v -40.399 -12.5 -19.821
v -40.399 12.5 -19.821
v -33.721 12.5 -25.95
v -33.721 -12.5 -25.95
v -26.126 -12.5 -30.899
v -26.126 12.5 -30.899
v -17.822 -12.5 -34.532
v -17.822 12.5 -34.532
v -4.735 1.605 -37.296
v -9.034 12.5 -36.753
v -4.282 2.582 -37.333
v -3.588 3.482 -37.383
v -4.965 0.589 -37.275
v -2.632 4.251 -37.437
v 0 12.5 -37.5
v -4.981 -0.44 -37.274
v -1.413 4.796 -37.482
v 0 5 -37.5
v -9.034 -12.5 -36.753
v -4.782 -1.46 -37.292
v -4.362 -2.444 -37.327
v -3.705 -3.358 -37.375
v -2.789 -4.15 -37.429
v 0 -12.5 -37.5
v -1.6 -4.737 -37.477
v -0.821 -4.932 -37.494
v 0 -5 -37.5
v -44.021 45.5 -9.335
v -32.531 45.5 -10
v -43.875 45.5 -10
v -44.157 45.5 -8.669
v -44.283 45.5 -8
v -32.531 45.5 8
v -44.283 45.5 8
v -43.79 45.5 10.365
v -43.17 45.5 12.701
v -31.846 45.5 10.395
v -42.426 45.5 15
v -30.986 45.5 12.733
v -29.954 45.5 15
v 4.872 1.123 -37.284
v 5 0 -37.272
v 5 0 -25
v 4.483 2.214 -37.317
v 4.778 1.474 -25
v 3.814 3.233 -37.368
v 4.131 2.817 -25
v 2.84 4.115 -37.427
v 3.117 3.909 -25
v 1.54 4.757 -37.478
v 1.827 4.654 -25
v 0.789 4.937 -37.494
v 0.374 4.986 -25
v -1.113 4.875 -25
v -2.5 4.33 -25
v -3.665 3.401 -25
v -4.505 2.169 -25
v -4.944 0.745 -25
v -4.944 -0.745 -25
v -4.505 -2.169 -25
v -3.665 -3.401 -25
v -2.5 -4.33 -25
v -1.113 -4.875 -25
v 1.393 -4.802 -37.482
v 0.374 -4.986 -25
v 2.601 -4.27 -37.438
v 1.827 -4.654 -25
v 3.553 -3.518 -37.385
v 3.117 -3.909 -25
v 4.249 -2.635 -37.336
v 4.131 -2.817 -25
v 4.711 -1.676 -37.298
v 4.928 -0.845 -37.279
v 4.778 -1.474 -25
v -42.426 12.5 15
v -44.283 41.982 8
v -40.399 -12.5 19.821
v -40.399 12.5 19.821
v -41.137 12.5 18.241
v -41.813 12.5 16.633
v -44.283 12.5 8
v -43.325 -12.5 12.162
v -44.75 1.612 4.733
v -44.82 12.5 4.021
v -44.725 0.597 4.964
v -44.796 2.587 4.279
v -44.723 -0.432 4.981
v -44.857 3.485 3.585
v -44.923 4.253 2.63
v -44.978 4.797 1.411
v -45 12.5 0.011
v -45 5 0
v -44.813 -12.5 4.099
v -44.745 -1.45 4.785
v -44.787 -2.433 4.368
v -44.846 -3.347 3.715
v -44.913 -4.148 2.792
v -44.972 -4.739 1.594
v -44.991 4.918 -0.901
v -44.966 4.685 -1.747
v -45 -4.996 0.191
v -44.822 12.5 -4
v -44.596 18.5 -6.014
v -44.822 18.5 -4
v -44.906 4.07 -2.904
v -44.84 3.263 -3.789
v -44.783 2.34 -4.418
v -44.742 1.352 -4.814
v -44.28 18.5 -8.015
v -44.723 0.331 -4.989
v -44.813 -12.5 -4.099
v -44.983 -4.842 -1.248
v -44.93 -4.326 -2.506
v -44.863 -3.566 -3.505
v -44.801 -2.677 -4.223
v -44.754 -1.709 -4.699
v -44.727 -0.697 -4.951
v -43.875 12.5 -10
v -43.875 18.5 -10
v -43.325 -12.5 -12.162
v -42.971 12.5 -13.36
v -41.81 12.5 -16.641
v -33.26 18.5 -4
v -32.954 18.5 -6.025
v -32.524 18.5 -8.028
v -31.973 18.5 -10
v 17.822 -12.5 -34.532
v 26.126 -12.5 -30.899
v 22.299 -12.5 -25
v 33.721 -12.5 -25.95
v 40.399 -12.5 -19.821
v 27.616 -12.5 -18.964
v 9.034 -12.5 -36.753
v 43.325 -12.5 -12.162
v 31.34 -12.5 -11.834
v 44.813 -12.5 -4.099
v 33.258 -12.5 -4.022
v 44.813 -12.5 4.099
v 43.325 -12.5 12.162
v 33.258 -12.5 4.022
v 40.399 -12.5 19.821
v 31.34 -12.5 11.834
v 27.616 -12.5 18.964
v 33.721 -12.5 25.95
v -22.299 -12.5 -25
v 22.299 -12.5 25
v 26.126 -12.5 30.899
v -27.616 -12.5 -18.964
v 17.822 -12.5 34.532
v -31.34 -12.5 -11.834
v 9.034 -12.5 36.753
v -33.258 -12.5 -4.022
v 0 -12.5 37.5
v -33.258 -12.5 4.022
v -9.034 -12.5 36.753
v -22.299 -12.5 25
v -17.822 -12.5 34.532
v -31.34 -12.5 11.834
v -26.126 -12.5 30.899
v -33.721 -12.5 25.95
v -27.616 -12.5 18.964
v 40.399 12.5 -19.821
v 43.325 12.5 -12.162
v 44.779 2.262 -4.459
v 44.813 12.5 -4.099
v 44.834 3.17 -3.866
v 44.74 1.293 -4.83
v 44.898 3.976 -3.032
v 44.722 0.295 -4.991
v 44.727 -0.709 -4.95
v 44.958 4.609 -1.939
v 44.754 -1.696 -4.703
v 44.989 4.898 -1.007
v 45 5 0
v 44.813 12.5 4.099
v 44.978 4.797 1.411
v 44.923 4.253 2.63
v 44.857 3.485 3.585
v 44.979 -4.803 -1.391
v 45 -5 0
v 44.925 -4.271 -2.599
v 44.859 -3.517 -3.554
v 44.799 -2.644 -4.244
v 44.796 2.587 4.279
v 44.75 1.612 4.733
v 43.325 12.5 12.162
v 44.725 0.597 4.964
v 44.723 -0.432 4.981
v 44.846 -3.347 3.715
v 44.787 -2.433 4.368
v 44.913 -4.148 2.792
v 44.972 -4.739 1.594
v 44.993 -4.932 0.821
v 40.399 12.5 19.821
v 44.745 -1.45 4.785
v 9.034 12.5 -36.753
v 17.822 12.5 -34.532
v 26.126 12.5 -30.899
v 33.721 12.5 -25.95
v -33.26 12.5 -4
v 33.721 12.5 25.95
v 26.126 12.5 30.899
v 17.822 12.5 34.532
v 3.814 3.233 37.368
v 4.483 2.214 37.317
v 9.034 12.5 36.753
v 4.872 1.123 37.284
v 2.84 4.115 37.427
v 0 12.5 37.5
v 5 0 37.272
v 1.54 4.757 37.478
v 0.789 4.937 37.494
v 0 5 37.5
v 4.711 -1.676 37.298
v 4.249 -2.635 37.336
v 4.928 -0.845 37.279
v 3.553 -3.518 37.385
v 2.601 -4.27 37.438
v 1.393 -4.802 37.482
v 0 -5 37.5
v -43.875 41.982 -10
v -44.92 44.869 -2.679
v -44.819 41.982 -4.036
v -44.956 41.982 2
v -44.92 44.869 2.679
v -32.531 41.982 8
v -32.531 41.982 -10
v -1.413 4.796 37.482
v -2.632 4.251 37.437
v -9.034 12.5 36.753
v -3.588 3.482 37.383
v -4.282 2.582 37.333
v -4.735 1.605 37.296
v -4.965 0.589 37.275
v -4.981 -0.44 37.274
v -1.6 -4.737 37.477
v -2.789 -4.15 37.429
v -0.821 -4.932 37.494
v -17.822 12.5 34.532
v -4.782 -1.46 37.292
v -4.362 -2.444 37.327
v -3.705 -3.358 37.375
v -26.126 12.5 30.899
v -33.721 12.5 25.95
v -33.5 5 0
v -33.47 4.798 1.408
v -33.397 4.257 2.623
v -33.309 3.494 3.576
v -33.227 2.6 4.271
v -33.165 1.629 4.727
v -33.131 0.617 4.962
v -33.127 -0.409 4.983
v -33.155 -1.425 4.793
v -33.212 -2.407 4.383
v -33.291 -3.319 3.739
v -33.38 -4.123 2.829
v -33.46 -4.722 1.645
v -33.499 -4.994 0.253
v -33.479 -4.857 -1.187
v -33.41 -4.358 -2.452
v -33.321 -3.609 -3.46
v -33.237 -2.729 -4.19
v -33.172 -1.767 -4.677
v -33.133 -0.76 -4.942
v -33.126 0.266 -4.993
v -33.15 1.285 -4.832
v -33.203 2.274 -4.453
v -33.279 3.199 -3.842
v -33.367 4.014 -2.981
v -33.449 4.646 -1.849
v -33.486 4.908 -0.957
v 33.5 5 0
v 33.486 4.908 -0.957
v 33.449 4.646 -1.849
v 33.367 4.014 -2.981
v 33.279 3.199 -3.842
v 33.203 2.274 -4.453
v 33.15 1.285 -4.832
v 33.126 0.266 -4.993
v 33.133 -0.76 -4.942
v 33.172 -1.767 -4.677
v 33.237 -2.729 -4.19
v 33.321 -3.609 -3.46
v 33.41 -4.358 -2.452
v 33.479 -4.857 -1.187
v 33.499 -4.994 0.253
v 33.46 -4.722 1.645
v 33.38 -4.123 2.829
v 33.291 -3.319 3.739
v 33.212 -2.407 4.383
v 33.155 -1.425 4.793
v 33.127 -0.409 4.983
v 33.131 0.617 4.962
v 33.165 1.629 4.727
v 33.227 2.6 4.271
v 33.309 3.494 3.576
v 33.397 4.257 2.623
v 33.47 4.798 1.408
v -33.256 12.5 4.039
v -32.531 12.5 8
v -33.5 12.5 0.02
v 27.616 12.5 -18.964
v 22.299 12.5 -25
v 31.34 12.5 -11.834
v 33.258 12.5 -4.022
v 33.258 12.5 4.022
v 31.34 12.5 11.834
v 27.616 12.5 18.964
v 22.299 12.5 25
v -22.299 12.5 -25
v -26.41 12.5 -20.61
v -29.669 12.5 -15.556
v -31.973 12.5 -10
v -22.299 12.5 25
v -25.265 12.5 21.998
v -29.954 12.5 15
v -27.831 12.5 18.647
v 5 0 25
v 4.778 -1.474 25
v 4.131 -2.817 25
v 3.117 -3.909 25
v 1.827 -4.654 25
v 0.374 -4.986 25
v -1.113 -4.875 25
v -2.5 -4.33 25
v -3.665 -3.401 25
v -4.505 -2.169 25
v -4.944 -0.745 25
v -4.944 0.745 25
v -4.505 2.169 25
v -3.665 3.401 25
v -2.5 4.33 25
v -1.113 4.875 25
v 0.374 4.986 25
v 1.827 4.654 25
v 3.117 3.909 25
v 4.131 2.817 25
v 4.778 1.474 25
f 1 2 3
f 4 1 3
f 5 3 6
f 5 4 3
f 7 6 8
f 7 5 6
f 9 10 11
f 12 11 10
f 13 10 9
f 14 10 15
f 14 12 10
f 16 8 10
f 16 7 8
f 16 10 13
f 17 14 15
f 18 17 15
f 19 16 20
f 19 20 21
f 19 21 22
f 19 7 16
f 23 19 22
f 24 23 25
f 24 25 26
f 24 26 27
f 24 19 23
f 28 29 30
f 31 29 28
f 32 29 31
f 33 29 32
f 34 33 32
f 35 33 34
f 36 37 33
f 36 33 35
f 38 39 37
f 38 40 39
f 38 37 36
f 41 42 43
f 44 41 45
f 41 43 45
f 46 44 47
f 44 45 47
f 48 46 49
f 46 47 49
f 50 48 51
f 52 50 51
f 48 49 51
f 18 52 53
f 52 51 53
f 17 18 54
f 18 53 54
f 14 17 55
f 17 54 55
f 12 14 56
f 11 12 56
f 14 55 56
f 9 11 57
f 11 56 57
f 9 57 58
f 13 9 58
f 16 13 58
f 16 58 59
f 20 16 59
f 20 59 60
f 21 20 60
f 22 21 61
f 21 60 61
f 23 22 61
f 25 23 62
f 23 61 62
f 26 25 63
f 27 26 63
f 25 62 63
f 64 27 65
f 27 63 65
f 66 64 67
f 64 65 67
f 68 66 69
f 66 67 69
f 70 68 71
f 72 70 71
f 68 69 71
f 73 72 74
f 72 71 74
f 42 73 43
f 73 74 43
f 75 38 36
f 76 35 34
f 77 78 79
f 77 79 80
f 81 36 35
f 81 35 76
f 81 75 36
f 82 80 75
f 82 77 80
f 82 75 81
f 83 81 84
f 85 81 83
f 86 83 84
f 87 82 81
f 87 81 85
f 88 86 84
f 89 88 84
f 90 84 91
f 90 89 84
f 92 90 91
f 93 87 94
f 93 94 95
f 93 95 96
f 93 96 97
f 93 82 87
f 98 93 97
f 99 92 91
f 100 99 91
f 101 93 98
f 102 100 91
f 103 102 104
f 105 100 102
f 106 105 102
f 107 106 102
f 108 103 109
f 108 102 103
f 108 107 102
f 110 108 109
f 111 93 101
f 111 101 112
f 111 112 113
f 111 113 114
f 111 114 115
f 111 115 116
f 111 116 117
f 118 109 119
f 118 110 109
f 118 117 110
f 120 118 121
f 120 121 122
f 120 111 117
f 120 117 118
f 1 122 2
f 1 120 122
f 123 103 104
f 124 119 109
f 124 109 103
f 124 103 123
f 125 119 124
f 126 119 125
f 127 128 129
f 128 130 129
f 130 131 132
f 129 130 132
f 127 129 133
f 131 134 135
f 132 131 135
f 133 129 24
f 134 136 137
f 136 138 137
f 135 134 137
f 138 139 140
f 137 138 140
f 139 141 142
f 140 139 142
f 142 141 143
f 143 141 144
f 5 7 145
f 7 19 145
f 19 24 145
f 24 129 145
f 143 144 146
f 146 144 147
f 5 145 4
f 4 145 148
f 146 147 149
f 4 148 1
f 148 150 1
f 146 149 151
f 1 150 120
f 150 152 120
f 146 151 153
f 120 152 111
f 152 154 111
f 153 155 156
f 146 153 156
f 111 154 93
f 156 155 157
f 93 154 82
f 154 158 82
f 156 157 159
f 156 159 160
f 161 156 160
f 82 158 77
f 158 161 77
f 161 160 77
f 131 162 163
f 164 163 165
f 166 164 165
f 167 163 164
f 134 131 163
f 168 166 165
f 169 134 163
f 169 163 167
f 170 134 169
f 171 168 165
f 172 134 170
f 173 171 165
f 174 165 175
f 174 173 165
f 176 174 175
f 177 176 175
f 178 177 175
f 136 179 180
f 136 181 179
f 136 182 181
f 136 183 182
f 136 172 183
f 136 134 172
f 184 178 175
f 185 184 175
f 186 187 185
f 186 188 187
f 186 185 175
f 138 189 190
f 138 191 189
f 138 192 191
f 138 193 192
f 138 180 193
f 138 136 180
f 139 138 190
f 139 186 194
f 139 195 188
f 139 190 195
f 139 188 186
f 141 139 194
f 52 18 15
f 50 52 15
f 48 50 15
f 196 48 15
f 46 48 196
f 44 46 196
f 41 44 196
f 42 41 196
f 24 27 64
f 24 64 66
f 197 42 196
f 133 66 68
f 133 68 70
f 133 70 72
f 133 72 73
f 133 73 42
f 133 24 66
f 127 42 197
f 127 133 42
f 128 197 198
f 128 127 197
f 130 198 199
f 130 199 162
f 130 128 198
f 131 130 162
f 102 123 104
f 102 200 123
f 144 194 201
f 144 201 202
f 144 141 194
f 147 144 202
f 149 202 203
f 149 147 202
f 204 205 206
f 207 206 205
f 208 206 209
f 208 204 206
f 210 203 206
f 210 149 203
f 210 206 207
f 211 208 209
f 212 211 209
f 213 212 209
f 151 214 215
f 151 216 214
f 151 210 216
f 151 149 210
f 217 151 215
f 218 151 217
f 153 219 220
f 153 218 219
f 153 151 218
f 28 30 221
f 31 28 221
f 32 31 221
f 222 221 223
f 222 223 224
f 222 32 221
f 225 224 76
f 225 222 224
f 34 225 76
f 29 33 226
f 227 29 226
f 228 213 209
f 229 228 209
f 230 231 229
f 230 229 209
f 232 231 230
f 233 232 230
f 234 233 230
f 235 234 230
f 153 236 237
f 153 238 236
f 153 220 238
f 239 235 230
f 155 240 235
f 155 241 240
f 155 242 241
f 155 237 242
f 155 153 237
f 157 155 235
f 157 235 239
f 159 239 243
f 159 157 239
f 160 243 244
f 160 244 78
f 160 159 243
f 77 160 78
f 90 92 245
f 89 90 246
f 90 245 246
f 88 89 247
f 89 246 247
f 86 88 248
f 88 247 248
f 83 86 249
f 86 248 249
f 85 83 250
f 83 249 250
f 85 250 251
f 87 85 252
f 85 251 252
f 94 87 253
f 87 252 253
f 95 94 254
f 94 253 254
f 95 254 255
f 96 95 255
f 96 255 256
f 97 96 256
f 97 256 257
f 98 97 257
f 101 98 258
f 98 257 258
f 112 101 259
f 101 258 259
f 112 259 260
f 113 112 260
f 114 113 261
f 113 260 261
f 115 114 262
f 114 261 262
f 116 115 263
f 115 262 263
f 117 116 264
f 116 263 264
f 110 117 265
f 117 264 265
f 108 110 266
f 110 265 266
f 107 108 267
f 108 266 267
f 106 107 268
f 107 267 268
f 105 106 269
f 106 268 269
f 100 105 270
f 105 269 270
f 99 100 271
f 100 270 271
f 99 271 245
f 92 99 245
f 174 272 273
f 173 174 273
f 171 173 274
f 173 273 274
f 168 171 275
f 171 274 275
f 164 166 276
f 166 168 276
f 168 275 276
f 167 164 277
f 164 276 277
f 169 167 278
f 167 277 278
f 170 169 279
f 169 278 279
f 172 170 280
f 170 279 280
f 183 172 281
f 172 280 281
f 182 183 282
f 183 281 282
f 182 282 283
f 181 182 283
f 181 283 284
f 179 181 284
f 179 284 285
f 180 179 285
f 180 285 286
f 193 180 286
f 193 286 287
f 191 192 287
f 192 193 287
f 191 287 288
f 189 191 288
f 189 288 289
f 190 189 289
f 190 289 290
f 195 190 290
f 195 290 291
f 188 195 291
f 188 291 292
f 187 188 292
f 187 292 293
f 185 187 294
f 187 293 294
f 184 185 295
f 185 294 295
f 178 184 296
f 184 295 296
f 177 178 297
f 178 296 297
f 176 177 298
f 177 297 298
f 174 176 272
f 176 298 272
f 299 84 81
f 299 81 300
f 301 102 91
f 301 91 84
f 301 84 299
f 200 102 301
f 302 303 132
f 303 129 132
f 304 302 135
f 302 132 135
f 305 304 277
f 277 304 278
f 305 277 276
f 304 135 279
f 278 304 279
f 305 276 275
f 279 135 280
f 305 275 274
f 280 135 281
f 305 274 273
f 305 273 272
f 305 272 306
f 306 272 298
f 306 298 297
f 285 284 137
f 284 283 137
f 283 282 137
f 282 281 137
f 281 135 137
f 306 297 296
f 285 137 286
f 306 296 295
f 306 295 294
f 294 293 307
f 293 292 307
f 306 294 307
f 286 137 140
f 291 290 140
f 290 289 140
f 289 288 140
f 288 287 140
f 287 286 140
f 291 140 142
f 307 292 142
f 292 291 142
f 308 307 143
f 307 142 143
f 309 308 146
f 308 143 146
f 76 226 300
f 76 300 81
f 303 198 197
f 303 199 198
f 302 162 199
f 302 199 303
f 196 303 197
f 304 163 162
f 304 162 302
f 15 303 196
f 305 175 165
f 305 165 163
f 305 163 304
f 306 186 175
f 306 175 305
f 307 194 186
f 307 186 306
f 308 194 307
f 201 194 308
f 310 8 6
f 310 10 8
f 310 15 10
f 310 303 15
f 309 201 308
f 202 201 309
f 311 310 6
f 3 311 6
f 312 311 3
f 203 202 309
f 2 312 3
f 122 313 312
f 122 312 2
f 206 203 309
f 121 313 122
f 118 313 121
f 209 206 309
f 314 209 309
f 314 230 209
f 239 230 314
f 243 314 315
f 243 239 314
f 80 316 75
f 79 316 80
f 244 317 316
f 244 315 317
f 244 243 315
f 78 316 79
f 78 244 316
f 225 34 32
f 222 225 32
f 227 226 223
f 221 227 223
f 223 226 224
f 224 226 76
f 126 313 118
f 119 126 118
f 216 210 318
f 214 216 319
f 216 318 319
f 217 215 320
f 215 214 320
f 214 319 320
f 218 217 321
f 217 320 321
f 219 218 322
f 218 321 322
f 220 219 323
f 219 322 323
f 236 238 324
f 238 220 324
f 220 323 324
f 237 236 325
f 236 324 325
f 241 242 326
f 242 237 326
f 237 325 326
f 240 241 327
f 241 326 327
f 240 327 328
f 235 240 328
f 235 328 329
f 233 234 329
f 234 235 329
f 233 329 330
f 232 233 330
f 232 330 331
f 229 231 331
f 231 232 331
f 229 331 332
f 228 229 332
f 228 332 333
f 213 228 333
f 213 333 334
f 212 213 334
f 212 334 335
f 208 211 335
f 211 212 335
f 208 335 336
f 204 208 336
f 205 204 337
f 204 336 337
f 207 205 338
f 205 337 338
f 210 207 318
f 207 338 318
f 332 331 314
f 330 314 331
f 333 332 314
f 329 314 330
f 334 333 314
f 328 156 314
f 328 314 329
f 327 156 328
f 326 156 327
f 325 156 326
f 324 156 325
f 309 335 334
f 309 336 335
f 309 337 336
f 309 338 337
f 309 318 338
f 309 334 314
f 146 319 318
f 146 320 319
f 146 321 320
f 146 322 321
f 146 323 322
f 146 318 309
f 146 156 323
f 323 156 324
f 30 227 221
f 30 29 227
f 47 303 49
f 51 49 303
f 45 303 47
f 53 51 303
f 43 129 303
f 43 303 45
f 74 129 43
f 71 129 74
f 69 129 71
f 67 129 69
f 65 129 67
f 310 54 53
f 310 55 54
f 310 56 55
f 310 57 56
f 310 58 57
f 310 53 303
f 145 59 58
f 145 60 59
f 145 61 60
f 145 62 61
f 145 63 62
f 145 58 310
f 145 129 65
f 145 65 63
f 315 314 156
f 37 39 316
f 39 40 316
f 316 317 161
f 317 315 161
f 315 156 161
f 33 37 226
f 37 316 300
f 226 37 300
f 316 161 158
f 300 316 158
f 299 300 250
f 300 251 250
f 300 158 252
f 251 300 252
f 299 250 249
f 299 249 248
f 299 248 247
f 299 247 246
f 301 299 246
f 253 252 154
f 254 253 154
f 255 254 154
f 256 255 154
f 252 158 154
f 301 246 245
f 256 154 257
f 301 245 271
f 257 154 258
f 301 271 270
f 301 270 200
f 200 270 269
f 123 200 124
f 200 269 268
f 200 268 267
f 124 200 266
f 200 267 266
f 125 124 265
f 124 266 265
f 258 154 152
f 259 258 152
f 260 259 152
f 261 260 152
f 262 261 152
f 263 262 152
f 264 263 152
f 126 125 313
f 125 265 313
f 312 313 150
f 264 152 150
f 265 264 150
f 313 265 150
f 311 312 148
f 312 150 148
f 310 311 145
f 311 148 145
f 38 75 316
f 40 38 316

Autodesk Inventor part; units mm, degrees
ref_plane "YZ Plane" through (0, 0, 0) normal (1, 0, 0) x (0, 1, 0)
ref_plane "XZ Plane" through (0, 0, 0) normal (0, 1, 0) x (-1, 0, 0)
ref_plane "XY Plane" through (0, 0, 0) normal (0, 0, 1) x (1, 0, 0)
sketch "Sketch1" plane through (0, 0, 0) normal (0, 1, 0) x (-1, 0, 0)
  line L0 (-22.2991, -25) -> (22.2991, -25)
  line L1 (22.2991, 25) -> (-22.2991, 25)
  arc A0 (-22.2991, 25) -> (-22.2991, -25) centre (0, 0) ccw
  arc A1 (22.2991, -25) -> (22.2991, 25) centre (0, 0) ccw
  line L2 (24.8747, 37.5) -> (-24.8747, 37.5)
  line L3 (24.8747, -37.5) -> (-24.8747, -37.5)
  arc A2 (24.8747, -37.5) -> (24.8747, 37.5) centre (0, 0) ccw
  arc A3 (-24.8747, 37.5) -> (-24.8747, -37.5) centre (0, 0) ccw
  circle A4 centre (0, 0) radius 25 construction
  arc A5 (0, 37.5) -> (-40.3994, 19.8214) centre (0, -17.5) ccw
  arc A6 (40.3994, 19.8214) -> (0, 37.5) centre (0, -17.5) ccw
  arc A7 (-40.3994, -19.8214) -> (0, -37.5) centre (0, 17.5) ccw
  arc A8 (0, -37.5) -> (40.3994, -19.8214) centre (0, 17.5) ccw
  point P0 (-40.0764, 20.168)
  point P1 (-40.0764, -20.168)
  point P2 (40.0764, 20.168)
  point P3 (40.0764, -20.168)
  dimension "d2" = 50
  dimension "d3" = 33.5
  dimension "d4" = 33.5
  dimension "d5" = 44.5982
  dimension "d7" = 12.5
  dimension "d8" = 12.5
  dimension "d54" = 45
  dimension "d55" = 45
  dimension "d60" = 55
  dimension "d61" = 55
  dimension "d62" = 55
  dimension "d63" = 55
extrude "Extrusion1" add sketch "Sketch1" along normal mid plane 25
sketch "Sketch3" plane through (0, 0, 0) normal (0, 0, 1) x (1, 0, 0)
  circle A0 centre (0, 0) radius 5
  dimension "d13" = 10
extrude "Extrusion2" cut sketch "Sketch3" along normal through all both and the other way through all
sketch "Sketch5" plane through (0, 0, 0) normal (1, 0, 0) x (0, 1, 0)
  circle A0 centre (0, 0) radius 5
  dimension "d17" = 10
extrude "Extrusion3" cut sketch "Sketch5" along normal through all both and the other way through all
sketch "Sketch6" plane through (0, 12.5, 0) normal (0, 1, 0) x (1, 0, 0)
  circle A0 centre (0, 0) radius 25 construction
  arc A1 (-22.2991, 25) -> (-22.2991, -25) centre (0, 0) ccw projected
  line L0 (-33.5, 0) -> (-47.5, 0) construction
  line L1 (-42.4264, -15) -> (-29.9541, -15)
  line L2 (-31.9726, 10) -> (-43.8748, 10)
  arc A2 (-24.8747, 37.5) -> (-24.8747, -37.5) centre (0, 0) ccw projected
  arc A3 (-43.8748, 10) -> (-43.9189, 9.8046) centre (0, 0) ccw
  line L3 (-32.5308, -8) -> (-44.2832, -8)
  arc A4 (-33.5, 0) -> (-29.9541, -15) centre (0, 0) ccw
  arc A5 (-43.9204, -9.798) -> (-42.4264, -15) centre (0, 0) ccw
  arc A6 (-43.8748, 10) -> (-43.9204, -9.798) centre (0, 0) ccw
  arc A7 (-31.9726, 10) -> (-33.5, 0) centre (0, 0) ccw
  line L4 (-44.7214, 5) -> (-33.1248, 5) projected
  arc A8 (-22.2991, 25) -> (-22.2991, -25) centre (0, 0) ccw projected
  line L5 (-33.2603, 4) -> (-44.8219, 4)
  point P0 (-44.2832, -8)
  point P1 (-44.8219, 4)
  dimension "d25" = 50
  dimension "d26" = 25
  dimension "d27" = 7
  dimension "d28" = 15
  dimension "d29" = 15
  dimension "d30" = 24.8046
  dimension "d31" = 5.202
  dimension "d32" = 47.5
  dimension "d37" = 6
extrude "Extrusion4" add sketch "Sketch6" along normal blind 6 contours A1 L4 A2 L2 | A1 L5 A2 L4 | A1 L3 A2 L5
extrude "Extrusion5" add sketch "Sketch6" along normal blind 33 contours A1 L1 A2 L3
extrude "Extrusion6" cut sketch "Sketch6" along normal through all contours A1 L3 A2 L5
sketch "Sketch7" plane through (-32.5308, 45.5, 8) normal (0, 0, -1) x (-1, 0, 0)
  line L0 (0, 0) -> (11.7524, 0) projected
  line L1 (-2.5766, -33) -> (-2.5766, 0) projected
  line L2 (11.7524, 0) -> (0, 0)
  line L3 (0, -3.5185) -> (15.3049, -3.5185)
  line L4 (15.3049, -3.5185) -> (11.7524, 0)
  line L5 (0, 0) -> (0, -3.5185)
  line L6 (0, -33) -> (0, 0) projected
  point P0 (-32.5308, -45.5)
  dimension "d40" = 5
  dimension "d41" = 15.3049
extrude "Extrusion7" add sketch "Sketch7" along normal up to surface (18 mm away)
sketch "Sketch8" plane through (0, 45.5, 0) normal (0, 1, 0) x (1, 0, 0)
  circle A0 centre (0, 0) radius 45
  circle A1 centre (0, 0) radius 62.5
  dimension "d56" = 90
  dimension "d57" = 125
extrude "Extrusion8" cut sketch "Sketch8" against normal through all
extrude "Extrusion9" cut sketch "Sketch1" along normal through all both and the other way through all contours A2 A6 L2 | A5 A3 L2 | A2 L3 A8 | A7 L3 A3
